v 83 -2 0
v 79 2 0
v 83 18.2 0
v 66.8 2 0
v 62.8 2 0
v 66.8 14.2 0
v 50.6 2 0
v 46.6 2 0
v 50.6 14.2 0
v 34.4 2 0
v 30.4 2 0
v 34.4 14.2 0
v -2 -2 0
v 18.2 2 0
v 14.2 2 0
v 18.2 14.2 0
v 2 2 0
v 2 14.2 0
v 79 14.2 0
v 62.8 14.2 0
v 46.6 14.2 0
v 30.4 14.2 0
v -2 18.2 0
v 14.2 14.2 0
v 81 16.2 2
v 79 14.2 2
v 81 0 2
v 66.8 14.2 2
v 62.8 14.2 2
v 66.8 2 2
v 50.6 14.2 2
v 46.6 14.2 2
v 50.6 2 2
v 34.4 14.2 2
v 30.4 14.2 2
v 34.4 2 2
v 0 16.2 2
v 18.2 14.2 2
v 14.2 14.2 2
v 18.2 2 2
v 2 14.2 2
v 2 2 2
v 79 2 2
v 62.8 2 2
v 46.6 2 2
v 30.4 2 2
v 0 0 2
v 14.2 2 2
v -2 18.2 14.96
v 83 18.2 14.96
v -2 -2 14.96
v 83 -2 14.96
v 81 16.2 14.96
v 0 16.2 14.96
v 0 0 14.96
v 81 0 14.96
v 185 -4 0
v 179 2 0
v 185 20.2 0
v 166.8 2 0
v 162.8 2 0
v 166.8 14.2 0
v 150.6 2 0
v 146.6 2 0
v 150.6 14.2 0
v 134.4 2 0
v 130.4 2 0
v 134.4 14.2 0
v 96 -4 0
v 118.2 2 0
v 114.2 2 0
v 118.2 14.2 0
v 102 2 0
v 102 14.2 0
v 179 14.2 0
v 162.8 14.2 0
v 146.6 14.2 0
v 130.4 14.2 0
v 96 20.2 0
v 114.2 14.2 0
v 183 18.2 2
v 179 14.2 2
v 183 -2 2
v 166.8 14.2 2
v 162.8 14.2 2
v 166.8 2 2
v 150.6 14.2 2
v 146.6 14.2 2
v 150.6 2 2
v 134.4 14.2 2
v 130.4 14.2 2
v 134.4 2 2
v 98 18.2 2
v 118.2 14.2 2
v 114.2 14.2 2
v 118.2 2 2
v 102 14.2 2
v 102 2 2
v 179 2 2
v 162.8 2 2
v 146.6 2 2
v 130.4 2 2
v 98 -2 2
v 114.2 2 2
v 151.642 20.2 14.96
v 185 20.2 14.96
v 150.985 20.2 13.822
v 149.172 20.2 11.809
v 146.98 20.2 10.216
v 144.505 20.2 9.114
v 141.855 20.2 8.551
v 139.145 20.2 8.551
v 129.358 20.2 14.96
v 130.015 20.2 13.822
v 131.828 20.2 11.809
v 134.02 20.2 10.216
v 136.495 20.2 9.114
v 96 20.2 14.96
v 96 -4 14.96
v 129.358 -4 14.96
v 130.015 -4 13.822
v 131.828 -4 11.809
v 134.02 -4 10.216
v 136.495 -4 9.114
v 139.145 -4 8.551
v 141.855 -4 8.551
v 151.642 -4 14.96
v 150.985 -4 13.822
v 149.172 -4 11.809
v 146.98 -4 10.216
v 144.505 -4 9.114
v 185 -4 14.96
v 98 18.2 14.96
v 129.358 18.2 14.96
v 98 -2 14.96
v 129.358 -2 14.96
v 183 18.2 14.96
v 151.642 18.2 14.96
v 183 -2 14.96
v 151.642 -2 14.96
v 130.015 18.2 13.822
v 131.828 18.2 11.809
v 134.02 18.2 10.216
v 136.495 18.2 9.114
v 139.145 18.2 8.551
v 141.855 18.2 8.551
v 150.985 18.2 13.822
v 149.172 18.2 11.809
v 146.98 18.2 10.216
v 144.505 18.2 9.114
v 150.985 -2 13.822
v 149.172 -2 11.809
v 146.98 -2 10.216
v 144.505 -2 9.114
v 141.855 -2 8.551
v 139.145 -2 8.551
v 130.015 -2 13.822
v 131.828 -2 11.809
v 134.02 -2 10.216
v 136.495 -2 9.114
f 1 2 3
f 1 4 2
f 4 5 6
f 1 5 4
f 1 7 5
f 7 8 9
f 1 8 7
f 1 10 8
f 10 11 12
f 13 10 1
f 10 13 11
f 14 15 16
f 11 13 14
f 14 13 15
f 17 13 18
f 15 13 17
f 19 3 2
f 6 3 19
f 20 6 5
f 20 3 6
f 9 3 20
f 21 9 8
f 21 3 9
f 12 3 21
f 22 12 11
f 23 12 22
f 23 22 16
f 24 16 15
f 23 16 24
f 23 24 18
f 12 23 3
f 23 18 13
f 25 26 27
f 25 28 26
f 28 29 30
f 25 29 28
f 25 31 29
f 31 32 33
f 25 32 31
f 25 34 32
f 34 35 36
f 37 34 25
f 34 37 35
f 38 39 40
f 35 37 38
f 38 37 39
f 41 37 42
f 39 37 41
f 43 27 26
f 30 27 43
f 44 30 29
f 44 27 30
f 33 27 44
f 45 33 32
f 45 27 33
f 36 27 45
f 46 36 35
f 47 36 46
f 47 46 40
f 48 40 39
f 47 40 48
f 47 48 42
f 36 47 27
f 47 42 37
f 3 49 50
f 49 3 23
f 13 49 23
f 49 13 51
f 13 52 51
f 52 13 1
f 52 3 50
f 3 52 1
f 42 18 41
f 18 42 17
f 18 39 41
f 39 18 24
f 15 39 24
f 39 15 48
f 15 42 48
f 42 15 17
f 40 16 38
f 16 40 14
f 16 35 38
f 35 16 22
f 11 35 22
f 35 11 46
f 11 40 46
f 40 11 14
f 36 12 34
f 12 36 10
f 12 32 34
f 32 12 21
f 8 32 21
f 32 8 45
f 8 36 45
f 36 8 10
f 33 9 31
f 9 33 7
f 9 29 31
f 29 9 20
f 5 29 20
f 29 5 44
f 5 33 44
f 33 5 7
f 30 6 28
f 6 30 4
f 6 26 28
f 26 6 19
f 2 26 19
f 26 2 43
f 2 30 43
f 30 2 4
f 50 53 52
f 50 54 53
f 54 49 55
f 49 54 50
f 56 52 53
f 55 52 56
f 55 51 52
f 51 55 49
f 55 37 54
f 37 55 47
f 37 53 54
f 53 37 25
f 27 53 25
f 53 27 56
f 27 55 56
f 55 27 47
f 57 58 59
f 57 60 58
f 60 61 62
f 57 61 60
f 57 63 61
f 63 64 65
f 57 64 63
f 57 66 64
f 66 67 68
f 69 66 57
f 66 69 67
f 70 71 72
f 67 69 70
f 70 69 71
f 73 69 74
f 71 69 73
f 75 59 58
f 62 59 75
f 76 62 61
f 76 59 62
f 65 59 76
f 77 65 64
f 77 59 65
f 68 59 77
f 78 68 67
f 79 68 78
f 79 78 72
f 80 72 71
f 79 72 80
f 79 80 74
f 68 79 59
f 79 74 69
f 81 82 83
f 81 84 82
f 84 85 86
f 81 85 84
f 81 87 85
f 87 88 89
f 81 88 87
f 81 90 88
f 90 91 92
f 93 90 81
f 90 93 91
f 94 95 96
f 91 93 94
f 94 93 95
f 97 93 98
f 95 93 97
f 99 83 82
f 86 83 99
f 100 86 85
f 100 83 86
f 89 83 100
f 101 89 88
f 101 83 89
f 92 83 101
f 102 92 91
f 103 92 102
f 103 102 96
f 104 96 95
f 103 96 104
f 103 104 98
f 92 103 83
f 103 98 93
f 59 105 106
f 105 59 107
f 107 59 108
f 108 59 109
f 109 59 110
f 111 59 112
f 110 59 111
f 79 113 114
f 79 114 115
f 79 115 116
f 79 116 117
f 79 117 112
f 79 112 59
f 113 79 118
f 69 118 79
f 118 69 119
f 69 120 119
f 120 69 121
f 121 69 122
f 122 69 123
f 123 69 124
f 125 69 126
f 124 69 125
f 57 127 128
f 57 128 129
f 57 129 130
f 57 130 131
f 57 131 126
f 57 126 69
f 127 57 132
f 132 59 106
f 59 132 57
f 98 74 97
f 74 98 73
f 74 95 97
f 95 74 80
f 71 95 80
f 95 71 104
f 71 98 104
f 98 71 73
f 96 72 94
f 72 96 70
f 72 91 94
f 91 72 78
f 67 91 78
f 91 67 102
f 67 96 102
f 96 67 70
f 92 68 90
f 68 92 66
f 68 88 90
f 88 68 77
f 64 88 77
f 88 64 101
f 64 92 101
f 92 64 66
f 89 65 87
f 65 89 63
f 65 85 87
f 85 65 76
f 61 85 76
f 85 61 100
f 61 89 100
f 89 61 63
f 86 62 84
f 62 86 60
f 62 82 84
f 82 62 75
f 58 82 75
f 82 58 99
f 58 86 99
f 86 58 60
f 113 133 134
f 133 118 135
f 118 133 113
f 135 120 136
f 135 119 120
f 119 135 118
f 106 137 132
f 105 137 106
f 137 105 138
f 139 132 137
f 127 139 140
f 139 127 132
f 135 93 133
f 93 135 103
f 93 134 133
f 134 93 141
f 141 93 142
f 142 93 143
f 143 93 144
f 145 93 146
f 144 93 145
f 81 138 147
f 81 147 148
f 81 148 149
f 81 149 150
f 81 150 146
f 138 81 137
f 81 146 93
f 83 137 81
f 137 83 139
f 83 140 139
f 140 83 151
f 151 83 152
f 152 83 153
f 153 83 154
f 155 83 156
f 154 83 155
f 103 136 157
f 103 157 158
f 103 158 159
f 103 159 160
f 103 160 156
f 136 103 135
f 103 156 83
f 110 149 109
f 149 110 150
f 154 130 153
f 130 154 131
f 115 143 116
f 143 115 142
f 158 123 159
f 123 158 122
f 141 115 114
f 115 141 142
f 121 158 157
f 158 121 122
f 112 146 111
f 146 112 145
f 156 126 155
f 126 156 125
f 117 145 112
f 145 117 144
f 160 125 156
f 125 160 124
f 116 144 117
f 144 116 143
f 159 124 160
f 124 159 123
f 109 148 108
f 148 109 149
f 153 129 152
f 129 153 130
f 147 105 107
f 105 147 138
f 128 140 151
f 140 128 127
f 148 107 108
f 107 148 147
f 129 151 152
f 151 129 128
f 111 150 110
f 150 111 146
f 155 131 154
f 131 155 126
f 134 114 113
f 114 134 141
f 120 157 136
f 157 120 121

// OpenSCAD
// file: diceware.scad
mm = 1;

die_width = 16.2 * mm;
wall_width = 2 * mm;
wall_height = 0.8 * die_width;
window_border = 2 * mm;

module clamshell()
{
    linear_extrude(wall_width) difference()
    {
        offset(delta = wall_width) children(0);
        if ($children > 1)
        {
            children(1);
        }
    }

    translate([ 0, 0, wall_width ]) linear_extrude(wall_height) difference()
    {
        offset(delta = wall_width) children(0);
        children(0);
    }
}

module window()
{
    offset(delta = -window_border) scale(die_width) polygon([ [ 0, 0 ], [ 1, 0 ], [ 1, 1 ], [ 0, 1 ] ]);
}

module diceware_bottom()
{
    clamshell()
    {
        // Base
        children(0);
        // Base Cutouts
        children(1);
    }
}

module diceware_top()
{
    difference()
    {
        clamshell()
        {
            // Base
            offset(delta = wall_width) children(0);

            // Base Cutouts
            children(1);
        }
        // Wall Cutouts
        children(2);
    }
}
// main file
include <diceware.scad>

module line_base()
{
    scale([ die_width, die_width ]) polygon([ [ 0, 0 ], [ 5, 0 ], [ 5, 1 ], [ 0, 1 ] ]);
}

module line_windows()
{
    for (x = [ 0, 1, 2, 3, 4 ])
    {
        translate([ die_width * x, 0 ]) window();
    }
}

module line_bottom()
{
    diceware_bottom()
    {
        line_base();
        line_windows();
    }
}

module line_top()
{
    diceware_top()
    {
        line_base();
        line_windows();
        translate([ 2.5 * die_width, -2 * wall_width - 0.1 * mm, wall_width + wall_height * 1.5 ]) rotate([ -90, 0, 0 ])
            cylinder(r = wall_height, h = die_width + 4 * wall_width + 0.2 * mm);
    }
}

line_bottom();
translate([ 100, 0, 0 ]) line_top();
